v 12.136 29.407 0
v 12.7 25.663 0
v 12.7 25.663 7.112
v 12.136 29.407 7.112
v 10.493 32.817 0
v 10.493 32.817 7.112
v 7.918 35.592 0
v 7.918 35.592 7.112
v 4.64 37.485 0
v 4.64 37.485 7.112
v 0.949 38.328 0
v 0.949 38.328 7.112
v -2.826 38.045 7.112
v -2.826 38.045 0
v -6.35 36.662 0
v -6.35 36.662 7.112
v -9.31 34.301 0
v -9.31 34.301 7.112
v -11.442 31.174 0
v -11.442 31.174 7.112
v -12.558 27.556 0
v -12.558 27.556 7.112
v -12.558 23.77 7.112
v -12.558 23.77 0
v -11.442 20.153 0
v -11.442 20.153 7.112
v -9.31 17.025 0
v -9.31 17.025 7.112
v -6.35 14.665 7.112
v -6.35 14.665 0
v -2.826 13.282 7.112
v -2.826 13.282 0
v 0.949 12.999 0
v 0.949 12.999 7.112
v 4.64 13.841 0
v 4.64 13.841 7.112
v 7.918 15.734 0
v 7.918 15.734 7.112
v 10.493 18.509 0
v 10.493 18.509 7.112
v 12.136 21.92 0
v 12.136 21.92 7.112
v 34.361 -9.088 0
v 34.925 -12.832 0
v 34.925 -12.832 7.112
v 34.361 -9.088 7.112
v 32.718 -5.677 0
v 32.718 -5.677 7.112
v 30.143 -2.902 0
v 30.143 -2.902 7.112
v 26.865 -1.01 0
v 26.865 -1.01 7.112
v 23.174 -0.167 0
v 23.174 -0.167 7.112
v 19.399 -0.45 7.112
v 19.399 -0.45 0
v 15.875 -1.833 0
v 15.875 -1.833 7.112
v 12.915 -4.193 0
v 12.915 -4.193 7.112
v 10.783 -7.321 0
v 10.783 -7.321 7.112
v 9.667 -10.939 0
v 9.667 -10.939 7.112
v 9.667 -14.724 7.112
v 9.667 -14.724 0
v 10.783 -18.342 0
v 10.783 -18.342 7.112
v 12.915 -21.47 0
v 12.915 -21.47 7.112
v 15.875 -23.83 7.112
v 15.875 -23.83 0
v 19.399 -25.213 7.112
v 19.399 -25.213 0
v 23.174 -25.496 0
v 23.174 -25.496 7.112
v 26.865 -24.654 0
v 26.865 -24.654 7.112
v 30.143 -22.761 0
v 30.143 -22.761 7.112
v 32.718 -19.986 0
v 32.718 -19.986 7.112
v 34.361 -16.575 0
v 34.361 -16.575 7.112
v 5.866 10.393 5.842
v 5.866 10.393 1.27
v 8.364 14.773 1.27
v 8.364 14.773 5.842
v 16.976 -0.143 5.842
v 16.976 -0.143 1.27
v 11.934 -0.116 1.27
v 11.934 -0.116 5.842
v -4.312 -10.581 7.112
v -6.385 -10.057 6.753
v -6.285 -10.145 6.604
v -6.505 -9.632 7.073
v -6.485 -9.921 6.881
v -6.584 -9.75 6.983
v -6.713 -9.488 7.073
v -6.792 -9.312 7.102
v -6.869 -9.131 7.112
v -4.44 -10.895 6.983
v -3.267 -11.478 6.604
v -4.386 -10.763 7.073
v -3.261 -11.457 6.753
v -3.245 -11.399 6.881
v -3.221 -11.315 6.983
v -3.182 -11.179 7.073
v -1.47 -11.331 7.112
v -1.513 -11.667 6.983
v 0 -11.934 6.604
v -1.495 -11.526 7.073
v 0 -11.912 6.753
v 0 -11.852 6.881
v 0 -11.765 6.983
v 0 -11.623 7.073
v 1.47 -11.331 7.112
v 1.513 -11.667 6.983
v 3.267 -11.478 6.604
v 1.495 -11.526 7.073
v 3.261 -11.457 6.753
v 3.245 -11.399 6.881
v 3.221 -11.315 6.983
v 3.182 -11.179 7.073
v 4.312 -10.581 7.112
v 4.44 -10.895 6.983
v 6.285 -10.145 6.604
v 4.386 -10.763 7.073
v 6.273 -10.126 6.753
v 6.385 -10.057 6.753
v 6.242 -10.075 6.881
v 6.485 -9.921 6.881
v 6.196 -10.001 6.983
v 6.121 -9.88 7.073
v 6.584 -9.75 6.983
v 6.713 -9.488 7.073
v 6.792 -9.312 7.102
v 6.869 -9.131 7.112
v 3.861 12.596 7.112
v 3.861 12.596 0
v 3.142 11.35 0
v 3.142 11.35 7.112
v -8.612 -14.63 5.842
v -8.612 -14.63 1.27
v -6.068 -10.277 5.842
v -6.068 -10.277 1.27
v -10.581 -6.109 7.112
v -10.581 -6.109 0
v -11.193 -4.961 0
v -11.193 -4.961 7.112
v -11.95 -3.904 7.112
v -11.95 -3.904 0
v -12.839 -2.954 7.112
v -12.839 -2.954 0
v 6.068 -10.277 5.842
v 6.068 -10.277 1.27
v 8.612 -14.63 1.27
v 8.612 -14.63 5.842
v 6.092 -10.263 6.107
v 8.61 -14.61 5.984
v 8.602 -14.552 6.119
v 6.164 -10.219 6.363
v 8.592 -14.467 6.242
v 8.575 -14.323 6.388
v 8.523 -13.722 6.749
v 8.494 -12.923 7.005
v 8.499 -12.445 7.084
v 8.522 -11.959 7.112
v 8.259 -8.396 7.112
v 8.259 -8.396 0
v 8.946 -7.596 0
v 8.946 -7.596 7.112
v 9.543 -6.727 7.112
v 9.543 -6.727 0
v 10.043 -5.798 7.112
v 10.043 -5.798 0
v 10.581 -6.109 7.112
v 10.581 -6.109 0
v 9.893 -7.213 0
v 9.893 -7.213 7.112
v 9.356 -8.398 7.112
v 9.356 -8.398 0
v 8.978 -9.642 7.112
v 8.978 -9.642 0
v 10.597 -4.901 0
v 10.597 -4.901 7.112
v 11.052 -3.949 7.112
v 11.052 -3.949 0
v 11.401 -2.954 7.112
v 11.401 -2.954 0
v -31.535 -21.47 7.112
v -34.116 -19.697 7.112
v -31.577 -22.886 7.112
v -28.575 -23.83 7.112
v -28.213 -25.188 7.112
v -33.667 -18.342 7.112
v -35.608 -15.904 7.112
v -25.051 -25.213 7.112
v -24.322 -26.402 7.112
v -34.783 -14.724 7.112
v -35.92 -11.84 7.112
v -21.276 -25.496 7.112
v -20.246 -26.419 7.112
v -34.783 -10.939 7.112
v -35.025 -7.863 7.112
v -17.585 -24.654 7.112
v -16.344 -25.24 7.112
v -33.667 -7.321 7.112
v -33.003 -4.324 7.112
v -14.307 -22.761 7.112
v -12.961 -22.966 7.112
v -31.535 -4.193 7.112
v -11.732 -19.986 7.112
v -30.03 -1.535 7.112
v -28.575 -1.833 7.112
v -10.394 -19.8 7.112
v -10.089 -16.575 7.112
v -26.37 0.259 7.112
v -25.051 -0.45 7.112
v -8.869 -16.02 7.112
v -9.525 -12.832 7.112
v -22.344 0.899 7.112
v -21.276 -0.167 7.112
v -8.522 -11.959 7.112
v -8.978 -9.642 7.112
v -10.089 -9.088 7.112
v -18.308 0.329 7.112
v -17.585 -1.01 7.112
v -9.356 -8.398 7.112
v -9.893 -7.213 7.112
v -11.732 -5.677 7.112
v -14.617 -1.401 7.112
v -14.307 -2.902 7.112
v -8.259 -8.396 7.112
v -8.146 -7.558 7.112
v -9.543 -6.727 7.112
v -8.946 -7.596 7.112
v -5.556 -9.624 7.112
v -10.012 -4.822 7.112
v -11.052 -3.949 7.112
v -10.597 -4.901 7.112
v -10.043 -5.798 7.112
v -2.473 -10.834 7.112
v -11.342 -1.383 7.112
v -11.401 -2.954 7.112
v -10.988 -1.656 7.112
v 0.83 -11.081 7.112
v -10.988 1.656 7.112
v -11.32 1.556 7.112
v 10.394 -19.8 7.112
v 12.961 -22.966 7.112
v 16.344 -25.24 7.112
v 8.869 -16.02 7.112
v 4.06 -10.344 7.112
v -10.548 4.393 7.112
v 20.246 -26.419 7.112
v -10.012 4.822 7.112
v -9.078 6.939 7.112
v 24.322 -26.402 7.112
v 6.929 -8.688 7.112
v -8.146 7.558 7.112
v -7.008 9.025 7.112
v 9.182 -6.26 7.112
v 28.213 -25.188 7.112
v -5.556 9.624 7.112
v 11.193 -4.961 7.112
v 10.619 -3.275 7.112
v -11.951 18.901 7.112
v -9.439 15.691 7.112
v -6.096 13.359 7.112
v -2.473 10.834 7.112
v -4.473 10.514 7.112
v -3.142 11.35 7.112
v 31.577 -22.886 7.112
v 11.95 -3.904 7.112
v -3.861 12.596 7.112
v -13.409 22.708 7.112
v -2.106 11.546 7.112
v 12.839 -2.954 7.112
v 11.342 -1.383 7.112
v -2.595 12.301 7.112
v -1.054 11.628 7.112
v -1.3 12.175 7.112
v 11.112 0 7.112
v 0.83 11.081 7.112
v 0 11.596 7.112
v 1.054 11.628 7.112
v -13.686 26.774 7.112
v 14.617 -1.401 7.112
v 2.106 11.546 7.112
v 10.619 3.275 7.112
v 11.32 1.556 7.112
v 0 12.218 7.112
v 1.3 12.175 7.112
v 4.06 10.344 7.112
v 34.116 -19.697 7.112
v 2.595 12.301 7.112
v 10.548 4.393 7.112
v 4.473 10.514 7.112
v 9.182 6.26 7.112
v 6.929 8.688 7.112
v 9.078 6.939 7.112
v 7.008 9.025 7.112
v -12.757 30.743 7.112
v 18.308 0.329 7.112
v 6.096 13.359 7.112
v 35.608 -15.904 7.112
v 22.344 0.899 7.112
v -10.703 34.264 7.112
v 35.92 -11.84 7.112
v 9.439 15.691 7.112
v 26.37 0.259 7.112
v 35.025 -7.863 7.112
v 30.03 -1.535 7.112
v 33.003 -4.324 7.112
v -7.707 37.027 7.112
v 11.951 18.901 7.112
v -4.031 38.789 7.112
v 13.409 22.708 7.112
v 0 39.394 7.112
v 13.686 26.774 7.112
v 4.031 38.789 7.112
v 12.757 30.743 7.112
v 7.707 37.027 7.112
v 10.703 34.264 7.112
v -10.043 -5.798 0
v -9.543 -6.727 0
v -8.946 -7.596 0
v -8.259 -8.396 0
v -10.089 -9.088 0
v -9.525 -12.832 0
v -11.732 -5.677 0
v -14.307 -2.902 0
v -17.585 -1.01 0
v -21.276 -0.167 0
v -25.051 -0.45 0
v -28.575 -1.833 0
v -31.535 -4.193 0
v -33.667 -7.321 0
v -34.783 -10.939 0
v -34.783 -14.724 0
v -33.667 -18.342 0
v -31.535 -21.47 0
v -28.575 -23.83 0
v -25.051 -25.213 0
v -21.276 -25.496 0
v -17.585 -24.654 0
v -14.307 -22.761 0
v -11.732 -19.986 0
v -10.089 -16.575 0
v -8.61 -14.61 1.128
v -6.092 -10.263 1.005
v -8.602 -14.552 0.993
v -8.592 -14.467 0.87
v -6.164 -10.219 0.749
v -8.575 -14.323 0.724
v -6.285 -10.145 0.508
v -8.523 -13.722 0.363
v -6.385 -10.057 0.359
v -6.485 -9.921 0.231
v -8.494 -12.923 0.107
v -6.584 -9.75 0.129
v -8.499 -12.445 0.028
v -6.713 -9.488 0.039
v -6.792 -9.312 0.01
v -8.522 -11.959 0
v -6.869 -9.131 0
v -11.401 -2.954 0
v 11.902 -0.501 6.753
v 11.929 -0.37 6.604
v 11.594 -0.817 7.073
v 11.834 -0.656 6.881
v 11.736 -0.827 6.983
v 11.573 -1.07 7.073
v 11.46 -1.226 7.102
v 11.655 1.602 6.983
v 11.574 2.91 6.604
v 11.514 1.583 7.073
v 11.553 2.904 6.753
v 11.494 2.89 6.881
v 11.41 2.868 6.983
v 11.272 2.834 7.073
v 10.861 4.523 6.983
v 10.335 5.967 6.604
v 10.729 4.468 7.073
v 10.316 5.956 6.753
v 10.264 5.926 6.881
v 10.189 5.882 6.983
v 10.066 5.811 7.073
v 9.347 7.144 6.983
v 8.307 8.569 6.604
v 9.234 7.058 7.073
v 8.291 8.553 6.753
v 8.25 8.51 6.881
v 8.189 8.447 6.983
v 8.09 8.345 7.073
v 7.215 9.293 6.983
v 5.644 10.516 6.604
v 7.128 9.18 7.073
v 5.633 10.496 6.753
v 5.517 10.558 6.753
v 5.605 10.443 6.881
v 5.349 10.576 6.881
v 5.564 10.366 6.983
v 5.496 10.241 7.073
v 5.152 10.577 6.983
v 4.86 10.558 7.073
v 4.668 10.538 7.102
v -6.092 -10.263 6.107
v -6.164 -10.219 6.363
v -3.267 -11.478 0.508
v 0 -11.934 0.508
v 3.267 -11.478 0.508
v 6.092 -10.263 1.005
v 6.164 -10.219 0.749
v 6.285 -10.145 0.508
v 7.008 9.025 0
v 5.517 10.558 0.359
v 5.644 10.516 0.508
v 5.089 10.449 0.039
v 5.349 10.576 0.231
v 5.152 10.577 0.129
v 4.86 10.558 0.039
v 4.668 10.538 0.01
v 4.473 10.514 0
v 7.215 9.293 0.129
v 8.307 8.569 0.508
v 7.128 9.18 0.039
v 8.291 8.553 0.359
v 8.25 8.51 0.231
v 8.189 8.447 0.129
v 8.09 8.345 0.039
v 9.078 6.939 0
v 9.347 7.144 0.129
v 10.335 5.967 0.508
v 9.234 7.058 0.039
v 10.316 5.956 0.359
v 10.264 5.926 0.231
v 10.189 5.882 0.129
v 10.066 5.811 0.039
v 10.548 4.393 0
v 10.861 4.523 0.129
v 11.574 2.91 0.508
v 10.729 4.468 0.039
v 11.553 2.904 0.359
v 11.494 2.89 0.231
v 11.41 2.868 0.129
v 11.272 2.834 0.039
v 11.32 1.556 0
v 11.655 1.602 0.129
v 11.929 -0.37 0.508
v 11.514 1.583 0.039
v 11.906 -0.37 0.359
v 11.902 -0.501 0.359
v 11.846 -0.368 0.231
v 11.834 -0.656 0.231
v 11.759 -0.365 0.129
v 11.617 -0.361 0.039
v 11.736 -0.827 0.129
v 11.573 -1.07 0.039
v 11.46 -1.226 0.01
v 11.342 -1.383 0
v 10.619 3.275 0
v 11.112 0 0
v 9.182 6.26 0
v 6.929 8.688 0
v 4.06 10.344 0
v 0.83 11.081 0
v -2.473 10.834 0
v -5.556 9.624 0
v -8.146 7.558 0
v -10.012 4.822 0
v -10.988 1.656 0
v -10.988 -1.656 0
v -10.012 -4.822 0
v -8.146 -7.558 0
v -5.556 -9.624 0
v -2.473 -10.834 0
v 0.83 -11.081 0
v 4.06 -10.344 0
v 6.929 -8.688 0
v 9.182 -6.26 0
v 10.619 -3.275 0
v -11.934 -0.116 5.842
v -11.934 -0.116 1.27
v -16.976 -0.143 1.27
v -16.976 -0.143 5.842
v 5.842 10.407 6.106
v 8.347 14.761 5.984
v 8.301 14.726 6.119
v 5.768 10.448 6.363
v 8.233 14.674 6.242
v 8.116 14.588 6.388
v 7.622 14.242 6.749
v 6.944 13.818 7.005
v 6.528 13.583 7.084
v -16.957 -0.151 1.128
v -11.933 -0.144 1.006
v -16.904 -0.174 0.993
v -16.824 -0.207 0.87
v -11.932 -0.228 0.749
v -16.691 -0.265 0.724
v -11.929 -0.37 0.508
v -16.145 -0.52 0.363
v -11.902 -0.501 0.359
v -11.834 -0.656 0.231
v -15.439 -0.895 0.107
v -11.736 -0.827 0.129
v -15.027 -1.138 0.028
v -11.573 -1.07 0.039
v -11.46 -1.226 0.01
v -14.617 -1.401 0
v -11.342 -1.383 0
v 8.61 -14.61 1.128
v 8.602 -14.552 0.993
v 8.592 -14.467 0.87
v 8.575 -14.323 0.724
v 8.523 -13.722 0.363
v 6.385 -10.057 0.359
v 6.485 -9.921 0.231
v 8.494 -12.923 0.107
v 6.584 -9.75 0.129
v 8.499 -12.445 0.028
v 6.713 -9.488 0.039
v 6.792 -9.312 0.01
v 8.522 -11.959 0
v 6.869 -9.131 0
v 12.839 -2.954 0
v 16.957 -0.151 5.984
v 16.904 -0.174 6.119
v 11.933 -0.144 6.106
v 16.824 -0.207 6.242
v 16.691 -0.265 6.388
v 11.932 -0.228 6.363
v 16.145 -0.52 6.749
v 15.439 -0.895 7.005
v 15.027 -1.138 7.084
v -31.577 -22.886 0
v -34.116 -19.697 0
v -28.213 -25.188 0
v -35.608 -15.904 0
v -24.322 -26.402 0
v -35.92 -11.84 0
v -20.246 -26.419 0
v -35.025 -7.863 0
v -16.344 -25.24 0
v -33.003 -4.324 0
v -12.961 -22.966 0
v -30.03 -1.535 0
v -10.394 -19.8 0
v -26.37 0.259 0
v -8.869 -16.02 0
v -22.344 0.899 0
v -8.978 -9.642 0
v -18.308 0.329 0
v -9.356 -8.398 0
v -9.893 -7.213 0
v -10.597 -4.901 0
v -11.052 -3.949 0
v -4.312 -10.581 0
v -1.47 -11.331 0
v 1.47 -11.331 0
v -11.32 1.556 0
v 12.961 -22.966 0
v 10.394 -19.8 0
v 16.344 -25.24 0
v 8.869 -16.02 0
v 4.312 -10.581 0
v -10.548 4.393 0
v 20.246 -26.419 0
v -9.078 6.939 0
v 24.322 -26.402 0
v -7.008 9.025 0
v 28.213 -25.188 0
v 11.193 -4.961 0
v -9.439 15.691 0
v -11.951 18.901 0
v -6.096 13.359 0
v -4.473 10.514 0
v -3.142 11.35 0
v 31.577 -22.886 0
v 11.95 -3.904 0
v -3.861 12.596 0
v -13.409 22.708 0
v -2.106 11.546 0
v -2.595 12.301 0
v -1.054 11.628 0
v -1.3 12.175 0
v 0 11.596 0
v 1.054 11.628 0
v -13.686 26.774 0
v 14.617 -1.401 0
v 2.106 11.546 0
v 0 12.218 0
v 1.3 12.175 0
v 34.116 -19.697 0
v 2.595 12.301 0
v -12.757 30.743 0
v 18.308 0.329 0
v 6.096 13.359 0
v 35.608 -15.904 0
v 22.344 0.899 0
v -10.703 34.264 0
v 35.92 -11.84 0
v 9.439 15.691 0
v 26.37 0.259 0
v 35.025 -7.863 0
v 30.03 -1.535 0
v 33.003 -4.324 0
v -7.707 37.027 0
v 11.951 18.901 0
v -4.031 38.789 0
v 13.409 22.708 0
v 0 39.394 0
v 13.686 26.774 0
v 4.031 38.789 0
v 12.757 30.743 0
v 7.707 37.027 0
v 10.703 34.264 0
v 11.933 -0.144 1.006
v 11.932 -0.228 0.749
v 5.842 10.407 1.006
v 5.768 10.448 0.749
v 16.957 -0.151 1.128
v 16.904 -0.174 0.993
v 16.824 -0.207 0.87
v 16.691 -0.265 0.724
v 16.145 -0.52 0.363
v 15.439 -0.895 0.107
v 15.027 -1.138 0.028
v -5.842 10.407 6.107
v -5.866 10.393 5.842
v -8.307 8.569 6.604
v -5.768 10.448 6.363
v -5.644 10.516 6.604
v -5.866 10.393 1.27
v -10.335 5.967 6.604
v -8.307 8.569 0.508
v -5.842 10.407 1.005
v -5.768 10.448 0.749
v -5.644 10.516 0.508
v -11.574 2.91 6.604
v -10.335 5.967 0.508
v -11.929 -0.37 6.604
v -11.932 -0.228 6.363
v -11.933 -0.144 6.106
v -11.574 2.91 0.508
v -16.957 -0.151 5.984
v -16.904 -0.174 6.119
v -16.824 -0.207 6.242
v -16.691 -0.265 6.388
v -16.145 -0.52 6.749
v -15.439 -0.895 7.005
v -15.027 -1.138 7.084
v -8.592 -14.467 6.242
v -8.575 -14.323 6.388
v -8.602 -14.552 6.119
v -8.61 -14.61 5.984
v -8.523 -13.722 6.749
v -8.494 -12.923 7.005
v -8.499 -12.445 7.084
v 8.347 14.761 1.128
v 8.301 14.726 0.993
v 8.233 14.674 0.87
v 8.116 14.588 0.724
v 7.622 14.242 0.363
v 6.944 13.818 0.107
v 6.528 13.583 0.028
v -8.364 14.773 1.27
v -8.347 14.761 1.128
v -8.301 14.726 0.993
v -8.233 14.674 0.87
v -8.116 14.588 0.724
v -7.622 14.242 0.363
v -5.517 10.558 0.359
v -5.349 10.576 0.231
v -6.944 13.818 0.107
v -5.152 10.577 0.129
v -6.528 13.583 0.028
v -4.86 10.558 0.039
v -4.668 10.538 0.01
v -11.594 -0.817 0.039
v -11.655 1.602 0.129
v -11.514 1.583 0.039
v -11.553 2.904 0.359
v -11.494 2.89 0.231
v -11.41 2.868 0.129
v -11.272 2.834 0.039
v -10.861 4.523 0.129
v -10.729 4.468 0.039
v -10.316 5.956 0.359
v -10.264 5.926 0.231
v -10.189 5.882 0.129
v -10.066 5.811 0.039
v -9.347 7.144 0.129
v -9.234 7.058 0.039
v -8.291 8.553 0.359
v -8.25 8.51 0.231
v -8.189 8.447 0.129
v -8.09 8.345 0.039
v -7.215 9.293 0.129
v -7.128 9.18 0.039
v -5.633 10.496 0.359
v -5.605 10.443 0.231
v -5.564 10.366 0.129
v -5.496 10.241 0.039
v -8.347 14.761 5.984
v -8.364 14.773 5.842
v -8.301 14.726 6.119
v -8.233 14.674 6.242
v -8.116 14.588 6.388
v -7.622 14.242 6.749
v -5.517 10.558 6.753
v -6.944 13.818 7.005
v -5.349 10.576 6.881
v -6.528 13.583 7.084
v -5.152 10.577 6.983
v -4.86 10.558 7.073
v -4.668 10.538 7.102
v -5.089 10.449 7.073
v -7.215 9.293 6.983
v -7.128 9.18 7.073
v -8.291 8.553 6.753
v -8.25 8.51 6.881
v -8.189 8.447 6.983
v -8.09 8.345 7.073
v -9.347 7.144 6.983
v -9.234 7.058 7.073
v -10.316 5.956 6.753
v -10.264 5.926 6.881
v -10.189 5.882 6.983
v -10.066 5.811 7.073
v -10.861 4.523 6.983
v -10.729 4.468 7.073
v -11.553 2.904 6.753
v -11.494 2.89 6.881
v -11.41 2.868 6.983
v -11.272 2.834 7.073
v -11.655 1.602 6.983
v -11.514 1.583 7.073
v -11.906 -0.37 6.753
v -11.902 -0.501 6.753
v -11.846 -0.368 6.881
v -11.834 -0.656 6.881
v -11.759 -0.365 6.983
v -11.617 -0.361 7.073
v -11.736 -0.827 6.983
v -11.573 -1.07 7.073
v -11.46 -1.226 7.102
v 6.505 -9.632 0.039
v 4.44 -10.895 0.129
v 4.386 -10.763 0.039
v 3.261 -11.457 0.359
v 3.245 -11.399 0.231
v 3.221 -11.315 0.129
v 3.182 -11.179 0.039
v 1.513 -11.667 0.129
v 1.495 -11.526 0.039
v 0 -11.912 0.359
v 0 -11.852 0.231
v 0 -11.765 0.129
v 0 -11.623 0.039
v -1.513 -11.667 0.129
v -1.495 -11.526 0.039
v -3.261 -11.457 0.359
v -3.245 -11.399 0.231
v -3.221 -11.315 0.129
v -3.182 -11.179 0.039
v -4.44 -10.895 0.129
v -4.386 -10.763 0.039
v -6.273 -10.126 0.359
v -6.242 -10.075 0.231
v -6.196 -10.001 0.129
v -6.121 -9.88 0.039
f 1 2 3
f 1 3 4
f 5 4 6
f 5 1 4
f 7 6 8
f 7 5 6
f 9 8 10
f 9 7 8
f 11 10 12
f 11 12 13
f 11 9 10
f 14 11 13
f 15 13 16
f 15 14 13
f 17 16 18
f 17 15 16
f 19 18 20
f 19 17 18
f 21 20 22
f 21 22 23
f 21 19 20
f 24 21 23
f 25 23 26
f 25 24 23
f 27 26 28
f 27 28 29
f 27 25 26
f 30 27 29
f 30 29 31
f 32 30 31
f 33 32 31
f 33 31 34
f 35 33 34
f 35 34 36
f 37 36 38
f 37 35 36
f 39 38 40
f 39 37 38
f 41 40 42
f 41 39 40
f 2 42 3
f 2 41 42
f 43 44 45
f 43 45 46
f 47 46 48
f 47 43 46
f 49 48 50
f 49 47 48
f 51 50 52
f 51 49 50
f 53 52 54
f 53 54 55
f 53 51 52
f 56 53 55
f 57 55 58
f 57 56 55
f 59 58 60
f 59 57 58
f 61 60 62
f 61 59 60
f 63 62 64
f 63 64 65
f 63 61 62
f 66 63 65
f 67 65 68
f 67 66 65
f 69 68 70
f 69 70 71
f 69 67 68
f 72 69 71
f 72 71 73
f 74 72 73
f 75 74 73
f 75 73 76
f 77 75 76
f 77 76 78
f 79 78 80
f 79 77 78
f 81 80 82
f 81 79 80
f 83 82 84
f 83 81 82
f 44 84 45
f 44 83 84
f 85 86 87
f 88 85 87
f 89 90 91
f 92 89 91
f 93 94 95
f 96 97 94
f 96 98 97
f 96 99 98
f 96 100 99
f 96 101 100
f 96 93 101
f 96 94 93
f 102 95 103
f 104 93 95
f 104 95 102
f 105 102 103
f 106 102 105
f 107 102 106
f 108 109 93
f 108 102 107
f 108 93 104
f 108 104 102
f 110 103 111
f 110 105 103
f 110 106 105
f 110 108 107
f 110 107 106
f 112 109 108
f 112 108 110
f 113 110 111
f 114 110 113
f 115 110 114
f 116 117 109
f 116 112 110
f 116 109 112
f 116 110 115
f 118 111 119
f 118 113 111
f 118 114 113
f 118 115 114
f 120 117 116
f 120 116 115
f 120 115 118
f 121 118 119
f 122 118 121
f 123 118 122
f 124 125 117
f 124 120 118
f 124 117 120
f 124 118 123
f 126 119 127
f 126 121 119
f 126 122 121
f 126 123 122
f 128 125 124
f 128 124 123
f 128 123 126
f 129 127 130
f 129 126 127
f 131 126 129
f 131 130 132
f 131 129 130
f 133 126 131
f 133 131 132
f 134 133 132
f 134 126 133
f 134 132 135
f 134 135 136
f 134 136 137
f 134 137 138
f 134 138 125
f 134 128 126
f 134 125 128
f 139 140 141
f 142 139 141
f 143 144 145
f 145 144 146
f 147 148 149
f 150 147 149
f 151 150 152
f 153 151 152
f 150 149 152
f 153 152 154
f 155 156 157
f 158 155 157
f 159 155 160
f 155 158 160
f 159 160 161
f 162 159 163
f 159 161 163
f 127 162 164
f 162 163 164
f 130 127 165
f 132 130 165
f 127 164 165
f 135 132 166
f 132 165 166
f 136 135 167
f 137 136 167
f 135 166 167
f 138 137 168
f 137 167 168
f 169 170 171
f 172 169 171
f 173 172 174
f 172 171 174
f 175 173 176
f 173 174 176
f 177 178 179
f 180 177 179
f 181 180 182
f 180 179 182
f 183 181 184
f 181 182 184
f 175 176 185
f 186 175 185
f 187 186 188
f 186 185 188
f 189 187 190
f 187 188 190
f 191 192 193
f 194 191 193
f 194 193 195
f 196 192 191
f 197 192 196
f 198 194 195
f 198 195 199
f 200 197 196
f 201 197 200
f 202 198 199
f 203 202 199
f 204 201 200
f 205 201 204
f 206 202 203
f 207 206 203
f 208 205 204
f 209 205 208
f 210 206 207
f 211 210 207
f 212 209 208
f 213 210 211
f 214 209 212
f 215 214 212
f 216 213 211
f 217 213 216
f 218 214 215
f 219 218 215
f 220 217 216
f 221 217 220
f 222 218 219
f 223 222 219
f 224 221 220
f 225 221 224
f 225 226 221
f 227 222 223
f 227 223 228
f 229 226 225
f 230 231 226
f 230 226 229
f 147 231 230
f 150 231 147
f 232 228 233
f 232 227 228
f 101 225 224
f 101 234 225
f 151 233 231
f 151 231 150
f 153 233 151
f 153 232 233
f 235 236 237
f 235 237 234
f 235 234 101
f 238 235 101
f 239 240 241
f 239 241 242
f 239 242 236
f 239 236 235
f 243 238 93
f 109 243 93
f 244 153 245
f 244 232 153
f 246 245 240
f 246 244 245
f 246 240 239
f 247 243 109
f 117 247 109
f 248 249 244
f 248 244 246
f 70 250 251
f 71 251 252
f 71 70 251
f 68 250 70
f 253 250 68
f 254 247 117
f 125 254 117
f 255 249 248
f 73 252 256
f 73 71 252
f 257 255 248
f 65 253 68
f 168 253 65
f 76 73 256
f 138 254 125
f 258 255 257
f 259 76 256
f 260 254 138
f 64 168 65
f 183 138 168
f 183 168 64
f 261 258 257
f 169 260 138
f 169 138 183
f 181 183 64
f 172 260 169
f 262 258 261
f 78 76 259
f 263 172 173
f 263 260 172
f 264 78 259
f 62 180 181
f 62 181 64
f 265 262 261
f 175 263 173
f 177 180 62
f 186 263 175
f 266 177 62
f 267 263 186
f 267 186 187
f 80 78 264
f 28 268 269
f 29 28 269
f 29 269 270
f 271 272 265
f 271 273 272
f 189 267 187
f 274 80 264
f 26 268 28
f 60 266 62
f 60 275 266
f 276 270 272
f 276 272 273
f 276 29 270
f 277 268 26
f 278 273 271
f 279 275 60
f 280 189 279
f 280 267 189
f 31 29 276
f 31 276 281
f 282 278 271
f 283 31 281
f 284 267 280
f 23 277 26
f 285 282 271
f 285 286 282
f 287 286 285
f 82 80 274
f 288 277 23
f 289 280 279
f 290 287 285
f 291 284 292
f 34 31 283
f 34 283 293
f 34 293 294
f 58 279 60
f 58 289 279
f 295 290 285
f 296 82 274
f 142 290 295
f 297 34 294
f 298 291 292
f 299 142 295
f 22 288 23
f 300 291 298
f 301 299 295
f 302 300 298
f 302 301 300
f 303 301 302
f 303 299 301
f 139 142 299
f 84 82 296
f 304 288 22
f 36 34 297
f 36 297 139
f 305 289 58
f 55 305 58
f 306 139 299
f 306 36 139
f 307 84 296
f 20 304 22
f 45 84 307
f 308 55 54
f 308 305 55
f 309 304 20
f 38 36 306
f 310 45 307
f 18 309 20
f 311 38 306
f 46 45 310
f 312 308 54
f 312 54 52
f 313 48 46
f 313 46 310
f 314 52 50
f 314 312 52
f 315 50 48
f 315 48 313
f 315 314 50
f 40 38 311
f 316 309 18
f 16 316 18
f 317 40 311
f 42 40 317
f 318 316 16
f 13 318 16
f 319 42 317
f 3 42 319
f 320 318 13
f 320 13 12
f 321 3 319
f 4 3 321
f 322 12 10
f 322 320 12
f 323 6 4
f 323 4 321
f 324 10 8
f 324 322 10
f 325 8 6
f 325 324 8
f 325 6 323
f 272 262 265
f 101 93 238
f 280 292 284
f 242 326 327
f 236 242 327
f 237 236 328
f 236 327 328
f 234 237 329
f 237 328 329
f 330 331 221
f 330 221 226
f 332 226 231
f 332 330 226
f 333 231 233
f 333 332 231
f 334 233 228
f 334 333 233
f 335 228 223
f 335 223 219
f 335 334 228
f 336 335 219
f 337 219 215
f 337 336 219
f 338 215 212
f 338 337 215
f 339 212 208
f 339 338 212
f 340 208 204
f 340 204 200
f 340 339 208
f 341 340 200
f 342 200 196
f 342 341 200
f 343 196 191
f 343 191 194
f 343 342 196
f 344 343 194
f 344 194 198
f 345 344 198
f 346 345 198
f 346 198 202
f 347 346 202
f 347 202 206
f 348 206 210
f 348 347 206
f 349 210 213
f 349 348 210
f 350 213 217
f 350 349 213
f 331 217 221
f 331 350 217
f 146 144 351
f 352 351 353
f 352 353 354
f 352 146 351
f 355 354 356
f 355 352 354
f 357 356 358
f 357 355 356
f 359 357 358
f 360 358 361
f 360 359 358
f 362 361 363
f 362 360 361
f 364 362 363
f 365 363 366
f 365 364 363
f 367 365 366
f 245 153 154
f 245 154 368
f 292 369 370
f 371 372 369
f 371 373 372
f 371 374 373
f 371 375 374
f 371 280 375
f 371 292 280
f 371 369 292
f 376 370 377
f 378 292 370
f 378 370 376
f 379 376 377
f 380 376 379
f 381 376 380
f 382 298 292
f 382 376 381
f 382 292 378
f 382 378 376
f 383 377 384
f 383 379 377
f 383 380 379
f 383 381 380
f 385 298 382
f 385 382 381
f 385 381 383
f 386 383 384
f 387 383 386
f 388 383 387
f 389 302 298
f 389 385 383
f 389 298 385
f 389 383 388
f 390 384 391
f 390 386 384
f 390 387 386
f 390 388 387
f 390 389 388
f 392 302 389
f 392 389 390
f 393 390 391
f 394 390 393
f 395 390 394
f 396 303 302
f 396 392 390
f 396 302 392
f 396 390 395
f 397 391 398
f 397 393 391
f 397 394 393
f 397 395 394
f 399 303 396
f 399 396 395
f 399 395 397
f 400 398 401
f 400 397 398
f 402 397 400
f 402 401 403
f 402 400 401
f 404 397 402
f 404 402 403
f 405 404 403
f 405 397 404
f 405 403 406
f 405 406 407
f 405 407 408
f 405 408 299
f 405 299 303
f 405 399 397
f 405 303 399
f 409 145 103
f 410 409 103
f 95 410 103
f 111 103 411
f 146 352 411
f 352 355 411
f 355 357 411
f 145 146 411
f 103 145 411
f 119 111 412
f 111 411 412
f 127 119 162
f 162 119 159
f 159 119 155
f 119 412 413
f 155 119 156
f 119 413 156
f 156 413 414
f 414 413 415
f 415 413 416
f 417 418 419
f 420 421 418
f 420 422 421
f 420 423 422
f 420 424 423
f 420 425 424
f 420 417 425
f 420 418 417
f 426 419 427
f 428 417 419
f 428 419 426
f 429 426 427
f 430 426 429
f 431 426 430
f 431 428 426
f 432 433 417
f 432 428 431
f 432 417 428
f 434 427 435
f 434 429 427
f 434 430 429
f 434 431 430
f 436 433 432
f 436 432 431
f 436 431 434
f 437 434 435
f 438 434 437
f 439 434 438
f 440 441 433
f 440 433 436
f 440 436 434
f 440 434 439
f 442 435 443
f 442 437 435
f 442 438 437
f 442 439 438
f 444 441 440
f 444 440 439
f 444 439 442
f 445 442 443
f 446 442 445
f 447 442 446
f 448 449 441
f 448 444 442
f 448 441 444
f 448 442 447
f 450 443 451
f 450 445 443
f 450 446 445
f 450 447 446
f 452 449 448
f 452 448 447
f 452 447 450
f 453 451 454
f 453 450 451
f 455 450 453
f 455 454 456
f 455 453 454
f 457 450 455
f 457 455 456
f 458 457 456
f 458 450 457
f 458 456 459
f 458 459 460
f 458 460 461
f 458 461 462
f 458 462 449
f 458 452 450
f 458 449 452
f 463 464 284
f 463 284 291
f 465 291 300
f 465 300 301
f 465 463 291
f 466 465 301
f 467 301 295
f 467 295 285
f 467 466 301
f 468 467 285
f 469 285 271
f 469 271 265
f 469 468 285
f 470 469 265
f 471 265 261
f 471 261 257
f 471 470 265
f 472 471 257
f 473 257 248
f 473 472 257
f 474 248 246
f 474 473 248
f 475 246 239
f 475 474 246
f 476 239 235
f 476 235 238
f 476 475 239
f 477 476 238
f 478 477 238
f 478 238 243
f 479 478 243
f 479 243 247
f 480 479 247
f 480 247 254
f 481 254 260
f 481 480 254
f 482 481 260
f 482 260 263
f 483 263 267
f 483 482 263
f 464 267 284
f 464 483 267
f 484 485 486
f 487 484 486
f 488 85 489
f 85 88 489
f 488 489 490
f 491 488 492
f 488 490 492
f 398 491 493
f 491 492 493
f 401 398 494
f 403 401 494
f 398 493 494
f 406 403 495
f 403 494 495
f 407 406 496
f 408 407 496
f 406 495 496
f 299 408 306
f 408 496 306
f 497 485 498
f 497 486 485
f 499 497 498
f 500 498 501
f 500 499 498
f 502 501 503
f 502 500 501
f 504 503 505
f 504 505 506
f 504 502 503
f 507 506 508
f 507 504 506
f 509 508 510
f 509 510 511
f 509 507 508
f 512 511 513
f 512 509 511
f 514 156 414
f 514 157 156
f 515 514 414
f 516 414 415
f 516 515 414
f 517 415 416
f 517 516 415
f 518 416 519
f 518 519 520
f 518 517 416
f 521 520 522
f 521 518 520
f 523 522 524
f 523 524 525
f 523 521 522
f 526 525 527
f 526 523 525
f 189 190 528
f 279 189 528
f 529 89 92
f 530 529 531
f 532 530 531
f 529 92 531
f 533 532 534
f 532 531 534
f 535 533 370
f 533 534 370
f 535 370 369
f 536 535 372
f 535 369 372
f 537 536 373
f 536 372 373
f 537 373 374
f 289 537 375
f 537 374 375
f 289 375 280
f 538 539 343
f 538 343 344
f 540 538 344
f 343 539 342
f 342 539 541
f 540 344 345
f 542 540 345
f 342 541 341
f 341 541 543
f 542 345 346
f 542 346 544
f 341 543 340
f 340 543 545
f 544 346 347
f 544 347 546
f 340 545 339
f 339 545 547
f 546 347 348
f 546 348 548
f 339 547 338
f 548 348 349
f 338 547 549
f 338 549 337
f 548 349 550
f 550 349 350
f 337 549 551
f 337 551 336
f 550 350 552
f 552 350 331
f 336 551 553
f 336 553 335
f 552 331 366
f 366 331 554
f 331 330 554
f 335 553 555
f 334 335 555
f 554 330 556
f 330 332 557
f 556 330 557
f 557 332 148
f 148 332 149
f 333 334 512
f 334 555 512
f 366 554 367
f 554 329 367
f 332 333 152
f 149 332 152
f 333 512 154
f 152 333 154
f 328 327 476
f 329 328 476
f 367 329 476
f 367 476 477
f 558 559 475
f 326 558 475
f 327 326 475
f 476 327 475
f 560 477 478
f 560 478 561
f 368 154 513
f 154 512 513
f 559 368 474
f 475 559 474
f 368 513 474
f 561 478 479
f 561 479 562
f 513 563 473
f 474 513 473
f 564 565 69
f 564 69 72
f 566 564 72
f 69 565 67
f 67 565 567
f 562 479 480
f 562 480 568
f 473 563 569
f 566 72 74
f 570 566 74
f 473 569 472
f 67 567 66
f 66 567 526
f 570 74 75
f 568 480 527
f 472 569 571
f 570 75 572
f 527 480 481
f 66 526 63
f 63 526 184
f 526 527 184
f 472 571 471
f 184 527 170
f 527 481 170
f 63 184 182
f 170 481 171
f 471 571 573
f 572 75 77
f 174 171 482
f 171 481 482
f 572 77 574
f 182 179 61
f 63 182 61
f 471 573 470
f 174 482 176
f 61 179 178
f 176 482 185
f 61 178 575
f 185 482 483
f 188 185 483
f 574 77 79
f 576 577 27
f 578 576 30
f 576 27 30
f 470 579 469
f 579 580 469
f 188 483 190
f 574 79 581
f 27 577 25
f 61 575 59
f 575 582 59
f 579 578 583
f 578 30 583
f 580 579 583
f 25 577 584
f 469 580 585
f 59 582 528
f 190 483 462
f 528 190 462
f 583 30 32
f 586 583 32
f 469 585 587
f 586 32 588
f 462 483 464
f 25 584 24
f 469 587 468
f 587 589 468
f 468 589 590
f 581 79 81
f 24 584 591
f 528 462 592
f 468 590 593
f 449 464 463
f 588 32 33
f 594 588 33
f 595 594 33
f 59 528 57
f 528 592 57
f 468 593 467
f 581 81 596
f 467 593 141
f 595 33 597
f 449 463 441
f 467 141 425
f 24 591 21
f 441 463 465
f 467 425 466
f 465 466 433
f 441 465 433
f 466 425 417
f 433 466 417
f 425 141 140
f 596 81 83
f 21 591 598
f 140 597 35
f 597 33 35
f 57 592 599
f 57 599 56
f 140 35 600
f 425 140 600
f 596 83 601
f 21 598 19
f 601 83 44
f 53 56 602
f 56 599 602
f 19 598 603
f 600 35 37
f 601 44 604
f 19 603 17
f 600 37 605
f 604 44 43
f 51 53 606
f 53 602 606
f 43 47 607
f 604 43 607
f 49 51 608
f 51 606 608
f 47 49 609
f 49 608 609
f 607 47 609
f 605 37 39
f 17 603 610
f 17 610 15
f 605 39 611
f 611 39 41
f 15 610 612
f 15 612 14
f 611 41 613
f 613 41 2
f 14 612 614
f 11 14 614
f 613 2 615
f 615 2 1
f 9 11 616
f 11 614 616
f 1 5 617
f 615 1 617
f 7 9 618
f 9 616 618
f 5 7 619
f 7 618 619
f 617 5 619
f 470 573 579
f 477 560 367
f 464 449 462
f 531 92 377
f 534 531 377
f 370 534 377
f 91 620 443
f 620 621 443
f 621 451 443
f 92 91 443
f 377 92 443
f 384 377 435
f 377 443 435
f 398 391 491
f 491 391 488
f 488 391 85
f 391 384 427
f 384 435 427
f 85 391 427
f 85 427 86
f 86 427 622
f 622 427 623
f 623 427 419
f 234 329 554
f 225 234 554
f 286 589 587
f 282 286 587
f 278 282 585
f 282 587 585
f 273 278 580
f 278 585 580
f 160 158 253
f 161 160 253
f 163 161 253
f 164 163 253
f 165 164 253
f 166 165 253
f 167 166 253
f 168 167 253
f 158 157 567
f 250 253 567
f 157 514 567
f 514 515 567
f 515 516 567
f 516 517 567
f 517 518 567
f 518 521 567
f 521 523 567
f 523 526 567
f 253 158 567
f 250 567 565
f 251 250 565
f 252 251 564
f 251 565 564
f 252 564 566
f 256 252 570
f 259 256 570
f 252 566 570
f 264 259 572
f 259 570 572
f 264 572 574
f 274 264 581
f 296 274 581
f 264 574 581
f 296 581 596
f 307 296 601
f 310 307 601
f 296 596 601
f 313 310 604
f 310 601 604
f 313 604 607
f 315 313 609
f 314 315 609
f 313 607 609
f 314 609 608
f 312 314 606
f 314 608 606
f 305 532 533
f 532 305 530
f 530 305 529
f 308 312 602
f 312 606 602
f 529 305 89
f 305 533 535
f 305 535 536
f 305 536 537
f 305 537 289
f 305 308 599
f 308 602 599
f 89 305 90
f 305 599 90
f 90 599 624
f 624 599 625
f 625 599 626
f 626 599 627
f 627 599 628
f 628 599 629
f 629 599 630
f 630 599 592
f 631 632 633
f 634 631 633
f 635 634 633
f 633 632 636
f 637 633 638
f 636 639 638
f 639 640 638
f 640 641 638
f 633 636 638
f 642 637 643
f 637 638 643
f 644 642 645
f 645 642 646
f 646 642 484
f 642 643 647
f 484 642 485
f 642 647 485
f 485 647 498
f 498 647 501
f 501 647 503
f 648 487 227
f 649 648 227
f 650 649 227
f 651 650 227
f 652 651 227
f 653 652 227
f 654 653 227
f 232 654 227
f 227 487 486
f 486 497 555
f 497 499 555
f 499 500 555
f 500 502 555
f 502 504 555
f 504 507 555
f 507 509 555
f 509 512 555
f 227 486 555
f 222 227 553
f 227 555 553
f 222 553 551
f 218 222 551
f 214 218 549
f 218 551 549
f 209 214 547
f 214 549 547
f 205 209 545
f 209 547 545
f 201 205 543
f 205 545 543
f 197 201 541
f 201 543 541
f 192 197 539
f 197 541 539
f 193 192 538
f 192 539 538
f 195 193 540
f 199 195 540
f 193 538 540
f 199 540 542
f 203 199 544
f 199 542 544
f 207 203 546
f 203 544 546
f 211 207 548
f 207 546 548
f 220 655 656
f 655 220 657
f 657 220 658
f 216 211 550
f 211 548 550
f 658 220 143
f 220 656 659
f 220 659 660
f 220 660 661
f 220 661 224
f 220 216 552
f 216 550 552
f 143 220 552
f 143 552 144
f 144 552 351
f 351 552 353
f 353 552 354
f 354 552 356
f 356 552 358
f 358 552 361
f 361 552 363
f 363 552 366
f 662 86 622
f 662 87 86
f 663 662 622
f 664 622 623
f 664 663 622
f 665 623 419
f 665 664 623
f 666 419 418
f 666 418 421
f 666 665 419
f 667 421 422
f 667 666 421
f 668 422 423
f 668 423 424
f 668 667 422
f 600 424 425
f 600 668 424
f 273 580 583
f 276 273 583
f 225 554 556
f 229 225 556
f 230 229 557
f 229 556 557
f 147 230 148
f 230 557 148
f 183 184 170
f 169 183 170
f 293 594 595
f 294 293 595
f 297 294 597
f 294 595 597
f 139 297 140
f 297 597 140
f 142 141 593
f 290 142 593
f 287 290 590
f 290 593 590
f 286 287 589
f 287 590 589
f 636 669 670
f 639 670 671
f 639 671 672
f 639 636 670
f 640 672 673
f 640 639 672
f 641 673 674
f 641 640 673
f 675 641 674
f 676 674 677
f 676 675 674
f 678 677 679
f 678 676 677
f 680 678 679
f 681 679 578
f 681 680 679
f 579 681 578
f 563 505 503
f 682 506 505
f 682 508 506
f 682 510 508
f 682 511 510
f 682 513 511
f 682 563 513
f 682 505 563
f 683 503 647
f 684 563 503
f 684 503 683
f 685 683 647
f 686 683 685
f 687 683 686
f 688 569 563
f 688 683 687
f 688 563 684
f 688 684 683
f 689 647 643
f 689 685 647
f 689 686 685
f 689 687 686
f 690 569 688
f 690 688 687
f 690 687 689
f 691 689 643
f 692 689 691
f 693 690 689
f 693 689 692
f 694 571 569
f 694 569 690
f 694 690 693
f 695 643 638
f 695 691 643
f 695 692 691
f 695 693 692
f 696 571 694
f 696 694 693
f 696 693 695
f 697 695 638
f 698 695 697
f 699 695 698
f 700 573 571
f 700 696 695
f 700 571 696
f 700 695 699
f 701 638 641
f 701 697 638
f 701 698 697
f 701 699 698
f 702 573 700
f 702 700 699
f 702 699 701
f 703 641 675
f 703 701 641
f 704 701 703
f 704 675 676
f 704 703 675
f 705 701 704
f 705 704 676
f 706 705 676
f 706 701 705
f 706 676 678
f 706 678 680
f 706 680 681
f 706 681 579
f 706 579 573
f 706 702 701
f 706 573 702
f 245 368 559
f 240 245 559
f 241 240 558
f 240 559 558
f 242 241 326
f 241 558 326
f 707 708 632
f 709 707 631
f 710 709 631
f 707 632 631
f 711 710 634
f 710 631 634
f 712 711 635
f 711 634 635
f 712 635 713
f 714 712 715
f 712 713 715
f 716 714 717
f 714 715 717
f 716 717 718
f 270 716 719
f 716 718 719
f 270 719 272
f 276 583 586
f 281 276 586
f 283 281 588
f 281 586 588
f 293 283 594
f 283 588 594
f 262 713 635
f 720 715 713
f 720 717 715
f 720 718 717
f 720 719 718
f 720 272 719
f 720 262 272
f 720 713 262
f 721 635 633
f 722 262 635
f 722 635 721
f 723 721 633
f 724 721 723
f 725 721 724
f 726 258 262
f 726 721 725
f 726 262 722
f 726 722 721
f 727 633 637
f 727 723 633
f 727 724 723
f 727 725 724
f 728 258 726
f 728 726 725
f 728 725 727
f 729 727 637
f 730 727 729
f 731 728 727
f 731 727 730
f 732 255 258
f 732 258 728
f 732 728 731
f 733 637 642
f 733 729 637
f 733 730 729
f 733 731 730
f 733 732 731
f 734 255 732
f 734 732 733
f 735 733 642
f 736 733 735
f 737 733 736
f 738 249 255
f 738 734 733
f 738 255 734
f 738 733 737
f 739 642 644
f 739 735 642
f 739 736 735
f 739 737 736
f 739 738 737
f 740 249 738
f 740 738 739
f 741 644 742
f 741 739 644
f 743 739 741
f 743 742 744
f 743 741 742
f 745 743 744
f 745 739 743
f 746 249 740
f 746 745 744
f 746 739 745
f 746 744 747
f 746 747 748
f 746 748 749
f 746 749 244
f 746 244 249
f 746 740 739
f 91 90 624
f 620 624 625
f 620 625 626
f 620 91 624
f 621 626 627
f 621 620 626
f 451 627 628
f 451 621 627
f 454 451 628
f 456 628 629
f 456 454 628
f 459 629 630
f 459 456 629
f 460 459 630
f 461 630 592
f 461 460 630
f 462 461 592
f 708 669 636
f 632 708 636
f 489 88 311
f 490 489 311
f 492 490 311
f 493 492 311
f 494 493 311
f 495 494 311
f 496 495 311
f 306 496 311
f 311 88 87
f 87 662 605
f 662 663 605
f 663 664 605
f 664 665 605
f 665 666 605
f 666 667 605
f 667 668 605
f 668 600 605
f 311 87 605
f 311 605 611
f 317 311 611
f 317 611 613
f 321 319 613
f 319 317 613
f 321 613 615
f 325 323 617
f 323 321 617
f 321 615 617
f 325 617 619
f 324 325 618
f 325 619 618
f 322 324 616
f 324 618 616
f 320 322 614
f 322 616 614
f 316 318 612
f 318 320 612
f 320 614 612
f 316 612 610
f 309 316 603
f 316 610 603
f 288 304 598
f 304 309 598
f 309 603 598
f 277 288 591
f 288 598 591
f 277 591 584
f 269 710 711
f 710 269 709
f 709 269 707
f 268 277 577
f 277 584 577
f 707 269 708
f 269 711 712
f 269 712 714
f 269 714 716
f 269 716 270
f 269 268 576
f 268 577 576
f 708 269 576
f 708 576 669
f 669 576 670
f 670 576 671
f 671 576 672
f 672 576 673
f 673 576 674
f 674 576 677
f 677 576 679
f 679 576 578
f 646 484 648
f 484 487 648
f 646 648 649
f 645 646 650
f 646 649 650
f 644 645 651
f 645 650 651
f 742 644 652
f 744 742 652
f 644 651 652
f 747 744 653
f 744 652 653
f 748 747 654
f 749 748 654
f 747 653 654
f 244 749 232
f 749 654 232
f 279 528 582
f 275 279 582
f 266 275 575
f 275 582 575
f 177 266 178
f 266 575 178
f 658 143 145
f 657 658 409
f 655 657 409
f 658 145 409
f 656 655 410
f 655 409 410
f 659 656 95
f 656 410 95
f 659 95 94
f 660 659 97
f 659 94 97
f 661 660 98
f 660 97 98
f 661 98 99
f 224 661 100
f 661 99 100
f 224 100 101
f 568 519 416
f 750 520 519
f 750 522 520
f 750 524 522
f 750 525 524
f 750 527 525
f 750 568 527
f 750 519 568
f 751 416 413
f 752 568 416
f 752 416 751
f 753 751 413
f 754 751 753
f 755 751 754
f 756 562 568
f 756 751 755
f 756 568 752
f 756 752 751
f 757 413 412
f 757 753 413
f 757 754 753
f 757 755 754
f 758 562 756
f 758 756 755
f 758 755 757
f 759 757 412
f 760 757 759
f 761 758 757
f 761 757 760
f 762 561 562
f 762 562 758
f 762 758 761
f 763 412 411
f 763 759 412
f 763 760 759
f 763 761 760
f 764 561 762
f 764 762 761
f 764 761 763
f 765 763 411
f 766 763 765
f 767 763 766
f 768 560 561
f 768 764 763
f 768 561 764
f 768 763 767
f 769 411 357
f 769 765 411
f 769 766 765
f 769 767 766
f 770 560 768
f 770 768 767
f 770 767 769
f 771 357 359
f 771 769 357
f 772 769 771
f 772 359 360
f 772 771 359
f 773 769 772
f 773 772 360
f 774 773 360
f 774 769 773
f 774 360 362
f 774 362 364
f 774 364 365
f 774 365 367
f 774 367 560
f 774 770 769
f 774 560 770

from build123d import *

# Parameters (mm, degrees)
F0_R     = 12.7
F0_R_2   = 11.1125
F1_DEPTH = 7.112
F2_R     = 1.27
F3_R     = 0.50799


# Not quite as in the source:
# - a fillet or chamfer is up to 0.001 mm smaller than in the source, because OpenCascade refuses the exact size
# - ends of sketch curves that miss each other by under 0.0002 mm in the source are joined


with BuildPart() as f1:
    # F0 (on Top) → F1 (new body)
    with BuildSketch(Plane.XY):
        with BuildLine():
            ThreePointArc((8.3638022209, 14.7734709329), (0, 39.3942033225), (-8.3638022209, 14.7734709329))
            Line((-8.3638022209, 14.7734709329), (-5.8662054787, 10.3931058657))
            ThreePointArc((-5.8662054787, 10.3931058657), (-10.3354618297, 5.9671806592), (-11.9337964262, -0.1162717145))
            Line((-11.9337964262, -0.1162717145), (-16.9761022194, -0.1434727603))
            ThreePointArc((-16.9761022194, -0.1434727603), (-34.1163779507, -19.6971066641), (-8.6122978741, -14.6300019249))
            Line((-8.6122978741, -14.6300019249), (-6.0675894575, -10.276836791))
            ThreePointArc((-6.0675894575, -10.276836791), (0, -11.934362834), (6.0675894575, -10.276836791))
            Line((6.0675894575, -10.276836791), (8.6122978741, -14.6300019249))
            ThreePointArc((8.6122978741, -14.6300019249), (34.1163779507, -19.6971066641), (16.9761022194, -0.1434727603))
            Line((16.9761022194, -0.1434727603), (11.9337964262, -0.1162717145))
            ThreePointArc((11.9337964262, -0.1162717145), (10.3354618297, 5.9671806592), (5.8662054787, 10.3931058657))
            Line((5.8662054787, 10.3931058657), (8.3638022209, 14.7734709329))
        make_face()
        with Locations((-22.225, -12.83160756)):
            Circle(F0_R, mode=Mode.SUBTRACT)
        with BuildLine():
            ThreePointArc((-8.9782080284, -9.6422017781), (-9.6052965229, -7.7965006784), (-10.5814479311, -6.109200777))
            ThreePointArc((-10.5814479311, -6.109200777), (-11.5546165578, -4.4201787661), (-12.8394961357, -2.9542534612))
            Line((-12.8394961357, -2.9542534612), (-11.4007424563, -2.9542534612))
            ThreePointArc((-11.4007424563, -2.9542534612), (-10.8372927454, -4.4313928826), (-10.042581953, -5.7980864121))
            ThreePointArc((-10.042581953, -5.7980864121), (-9.2563462346, -7.1696730271), (-8.258831006, -8.3962046475))
            Line((-8.258831006, -8.3962046475), (-8.9782080284, -9.6422017781))
        make_face(mode=Mode.SUBTRACT)
        with Locations((22.225, -12.83160756)):
            Circle(F0_R, mode=Mode.SUBTRACT)
        with BuildLine():
            Line((11.4007424563, -2.9542534612), (12.8394961357, -2.9542534612))
            ThreePointArc((12.8394961357, -2.9542534612), (11.5546165578, -4.4201787661), (10.5814479311, -6.109200777))
            ThreePointArc((10.5814479311, -6.109200777), (9.6052965229, -7.7965006784), (8.9782080284, -9.6422017781))
            Line((8.9782080284, -9.6422017781), (8.258831006, -8.3962046475))
            ThreePointArc((8.258831006, -8.3962046475), (9.2563462346, -7.1696730271), (10.042581953, -5.7980864121))
            ThreePointArc((10.042581953, -5.7980864121), (10.8372927454, -4.4313928826), (11.4007424563, -2.9542534612))
        make_face(mode=Mode.SUBTRACT)
        Circle(F0_R_2, mode=Mode.SUBTRACT)
        with BuildLine():
            ThreePointArc((-3.8612913684, 12.5964559897), (-1.9493229697, 12.2166805672), (-2.6876e-06, 12.2184031057))
            ThreePointArc((-2.6876e-06, 12.2184031057), (1.9493202828, 12.2166814247), (3.8612885145, 12.5964576884))
            Line((3.8612885145, 12.5964576884), (3.1419093526, 11.3504602412))
            ThreePointArc((3.1419093526, 11.3504602412), (1.5809467105, 11.6010677307), (0, 11.5961742969))
            ThreePointArc((0, 11.5961742969), (-1.5809492634, 11.6010670352), (-3.141914346, 11.350458859))
            Line((-3.141914346, 11.350458859), (-3.8612913684, 12.5964559897))
        make_face(mode=Mode.SUBTRACT)
        with Locations((0, 25.6632216382)):
            Circle(F0_R, mode=Mode.SUBTRACT)
    extrude(amount=F1_DEPTH)

    # F2
    f2_edges = [f1.edges().sort_by_distance(p)[0] for p in [
        (-7.339944, -12.453419, 7.112),
        (-14.454949, -0.129872, 7.112),
        (7.339944, -12.453419, 7.112),
        (14.454949, -0.129872, 7.112),
        (7.115004, 12.583288, 7.112),
        (-7.115004, 12.583288, 7.112),
        (-7.339944, -12.453419, 0),
        (7.339944, -12.453419, 0),
        (14.454949, -0.129872, 0),
        (7.115004, 12.583288, 0),
        (-7.115004, 12.583288, 0),
        (-14.454949, -0.129872, 0),
    ]]
    fillet(f2_edges, radius=F2_R)

    # F3 (radius 0.508 in the source; OpenCascade refuses exactly that, so slightly less here)
    f3_edges = [f1.edges().sort_by_distance(p)[0] for p in [
        (-10.335462, 5.967181, 7.112),
        (0, -11.934363, 7.112),
        (10.335462, 5.967181, 7.112),
        (10.335462, 5.967181, 0),
        (-10.335462, 5.967181, 0),
        (0, -11.934363, 0),
    ]]
    fillet(f3_edges, radius=F3_R)


solid = f1.part
